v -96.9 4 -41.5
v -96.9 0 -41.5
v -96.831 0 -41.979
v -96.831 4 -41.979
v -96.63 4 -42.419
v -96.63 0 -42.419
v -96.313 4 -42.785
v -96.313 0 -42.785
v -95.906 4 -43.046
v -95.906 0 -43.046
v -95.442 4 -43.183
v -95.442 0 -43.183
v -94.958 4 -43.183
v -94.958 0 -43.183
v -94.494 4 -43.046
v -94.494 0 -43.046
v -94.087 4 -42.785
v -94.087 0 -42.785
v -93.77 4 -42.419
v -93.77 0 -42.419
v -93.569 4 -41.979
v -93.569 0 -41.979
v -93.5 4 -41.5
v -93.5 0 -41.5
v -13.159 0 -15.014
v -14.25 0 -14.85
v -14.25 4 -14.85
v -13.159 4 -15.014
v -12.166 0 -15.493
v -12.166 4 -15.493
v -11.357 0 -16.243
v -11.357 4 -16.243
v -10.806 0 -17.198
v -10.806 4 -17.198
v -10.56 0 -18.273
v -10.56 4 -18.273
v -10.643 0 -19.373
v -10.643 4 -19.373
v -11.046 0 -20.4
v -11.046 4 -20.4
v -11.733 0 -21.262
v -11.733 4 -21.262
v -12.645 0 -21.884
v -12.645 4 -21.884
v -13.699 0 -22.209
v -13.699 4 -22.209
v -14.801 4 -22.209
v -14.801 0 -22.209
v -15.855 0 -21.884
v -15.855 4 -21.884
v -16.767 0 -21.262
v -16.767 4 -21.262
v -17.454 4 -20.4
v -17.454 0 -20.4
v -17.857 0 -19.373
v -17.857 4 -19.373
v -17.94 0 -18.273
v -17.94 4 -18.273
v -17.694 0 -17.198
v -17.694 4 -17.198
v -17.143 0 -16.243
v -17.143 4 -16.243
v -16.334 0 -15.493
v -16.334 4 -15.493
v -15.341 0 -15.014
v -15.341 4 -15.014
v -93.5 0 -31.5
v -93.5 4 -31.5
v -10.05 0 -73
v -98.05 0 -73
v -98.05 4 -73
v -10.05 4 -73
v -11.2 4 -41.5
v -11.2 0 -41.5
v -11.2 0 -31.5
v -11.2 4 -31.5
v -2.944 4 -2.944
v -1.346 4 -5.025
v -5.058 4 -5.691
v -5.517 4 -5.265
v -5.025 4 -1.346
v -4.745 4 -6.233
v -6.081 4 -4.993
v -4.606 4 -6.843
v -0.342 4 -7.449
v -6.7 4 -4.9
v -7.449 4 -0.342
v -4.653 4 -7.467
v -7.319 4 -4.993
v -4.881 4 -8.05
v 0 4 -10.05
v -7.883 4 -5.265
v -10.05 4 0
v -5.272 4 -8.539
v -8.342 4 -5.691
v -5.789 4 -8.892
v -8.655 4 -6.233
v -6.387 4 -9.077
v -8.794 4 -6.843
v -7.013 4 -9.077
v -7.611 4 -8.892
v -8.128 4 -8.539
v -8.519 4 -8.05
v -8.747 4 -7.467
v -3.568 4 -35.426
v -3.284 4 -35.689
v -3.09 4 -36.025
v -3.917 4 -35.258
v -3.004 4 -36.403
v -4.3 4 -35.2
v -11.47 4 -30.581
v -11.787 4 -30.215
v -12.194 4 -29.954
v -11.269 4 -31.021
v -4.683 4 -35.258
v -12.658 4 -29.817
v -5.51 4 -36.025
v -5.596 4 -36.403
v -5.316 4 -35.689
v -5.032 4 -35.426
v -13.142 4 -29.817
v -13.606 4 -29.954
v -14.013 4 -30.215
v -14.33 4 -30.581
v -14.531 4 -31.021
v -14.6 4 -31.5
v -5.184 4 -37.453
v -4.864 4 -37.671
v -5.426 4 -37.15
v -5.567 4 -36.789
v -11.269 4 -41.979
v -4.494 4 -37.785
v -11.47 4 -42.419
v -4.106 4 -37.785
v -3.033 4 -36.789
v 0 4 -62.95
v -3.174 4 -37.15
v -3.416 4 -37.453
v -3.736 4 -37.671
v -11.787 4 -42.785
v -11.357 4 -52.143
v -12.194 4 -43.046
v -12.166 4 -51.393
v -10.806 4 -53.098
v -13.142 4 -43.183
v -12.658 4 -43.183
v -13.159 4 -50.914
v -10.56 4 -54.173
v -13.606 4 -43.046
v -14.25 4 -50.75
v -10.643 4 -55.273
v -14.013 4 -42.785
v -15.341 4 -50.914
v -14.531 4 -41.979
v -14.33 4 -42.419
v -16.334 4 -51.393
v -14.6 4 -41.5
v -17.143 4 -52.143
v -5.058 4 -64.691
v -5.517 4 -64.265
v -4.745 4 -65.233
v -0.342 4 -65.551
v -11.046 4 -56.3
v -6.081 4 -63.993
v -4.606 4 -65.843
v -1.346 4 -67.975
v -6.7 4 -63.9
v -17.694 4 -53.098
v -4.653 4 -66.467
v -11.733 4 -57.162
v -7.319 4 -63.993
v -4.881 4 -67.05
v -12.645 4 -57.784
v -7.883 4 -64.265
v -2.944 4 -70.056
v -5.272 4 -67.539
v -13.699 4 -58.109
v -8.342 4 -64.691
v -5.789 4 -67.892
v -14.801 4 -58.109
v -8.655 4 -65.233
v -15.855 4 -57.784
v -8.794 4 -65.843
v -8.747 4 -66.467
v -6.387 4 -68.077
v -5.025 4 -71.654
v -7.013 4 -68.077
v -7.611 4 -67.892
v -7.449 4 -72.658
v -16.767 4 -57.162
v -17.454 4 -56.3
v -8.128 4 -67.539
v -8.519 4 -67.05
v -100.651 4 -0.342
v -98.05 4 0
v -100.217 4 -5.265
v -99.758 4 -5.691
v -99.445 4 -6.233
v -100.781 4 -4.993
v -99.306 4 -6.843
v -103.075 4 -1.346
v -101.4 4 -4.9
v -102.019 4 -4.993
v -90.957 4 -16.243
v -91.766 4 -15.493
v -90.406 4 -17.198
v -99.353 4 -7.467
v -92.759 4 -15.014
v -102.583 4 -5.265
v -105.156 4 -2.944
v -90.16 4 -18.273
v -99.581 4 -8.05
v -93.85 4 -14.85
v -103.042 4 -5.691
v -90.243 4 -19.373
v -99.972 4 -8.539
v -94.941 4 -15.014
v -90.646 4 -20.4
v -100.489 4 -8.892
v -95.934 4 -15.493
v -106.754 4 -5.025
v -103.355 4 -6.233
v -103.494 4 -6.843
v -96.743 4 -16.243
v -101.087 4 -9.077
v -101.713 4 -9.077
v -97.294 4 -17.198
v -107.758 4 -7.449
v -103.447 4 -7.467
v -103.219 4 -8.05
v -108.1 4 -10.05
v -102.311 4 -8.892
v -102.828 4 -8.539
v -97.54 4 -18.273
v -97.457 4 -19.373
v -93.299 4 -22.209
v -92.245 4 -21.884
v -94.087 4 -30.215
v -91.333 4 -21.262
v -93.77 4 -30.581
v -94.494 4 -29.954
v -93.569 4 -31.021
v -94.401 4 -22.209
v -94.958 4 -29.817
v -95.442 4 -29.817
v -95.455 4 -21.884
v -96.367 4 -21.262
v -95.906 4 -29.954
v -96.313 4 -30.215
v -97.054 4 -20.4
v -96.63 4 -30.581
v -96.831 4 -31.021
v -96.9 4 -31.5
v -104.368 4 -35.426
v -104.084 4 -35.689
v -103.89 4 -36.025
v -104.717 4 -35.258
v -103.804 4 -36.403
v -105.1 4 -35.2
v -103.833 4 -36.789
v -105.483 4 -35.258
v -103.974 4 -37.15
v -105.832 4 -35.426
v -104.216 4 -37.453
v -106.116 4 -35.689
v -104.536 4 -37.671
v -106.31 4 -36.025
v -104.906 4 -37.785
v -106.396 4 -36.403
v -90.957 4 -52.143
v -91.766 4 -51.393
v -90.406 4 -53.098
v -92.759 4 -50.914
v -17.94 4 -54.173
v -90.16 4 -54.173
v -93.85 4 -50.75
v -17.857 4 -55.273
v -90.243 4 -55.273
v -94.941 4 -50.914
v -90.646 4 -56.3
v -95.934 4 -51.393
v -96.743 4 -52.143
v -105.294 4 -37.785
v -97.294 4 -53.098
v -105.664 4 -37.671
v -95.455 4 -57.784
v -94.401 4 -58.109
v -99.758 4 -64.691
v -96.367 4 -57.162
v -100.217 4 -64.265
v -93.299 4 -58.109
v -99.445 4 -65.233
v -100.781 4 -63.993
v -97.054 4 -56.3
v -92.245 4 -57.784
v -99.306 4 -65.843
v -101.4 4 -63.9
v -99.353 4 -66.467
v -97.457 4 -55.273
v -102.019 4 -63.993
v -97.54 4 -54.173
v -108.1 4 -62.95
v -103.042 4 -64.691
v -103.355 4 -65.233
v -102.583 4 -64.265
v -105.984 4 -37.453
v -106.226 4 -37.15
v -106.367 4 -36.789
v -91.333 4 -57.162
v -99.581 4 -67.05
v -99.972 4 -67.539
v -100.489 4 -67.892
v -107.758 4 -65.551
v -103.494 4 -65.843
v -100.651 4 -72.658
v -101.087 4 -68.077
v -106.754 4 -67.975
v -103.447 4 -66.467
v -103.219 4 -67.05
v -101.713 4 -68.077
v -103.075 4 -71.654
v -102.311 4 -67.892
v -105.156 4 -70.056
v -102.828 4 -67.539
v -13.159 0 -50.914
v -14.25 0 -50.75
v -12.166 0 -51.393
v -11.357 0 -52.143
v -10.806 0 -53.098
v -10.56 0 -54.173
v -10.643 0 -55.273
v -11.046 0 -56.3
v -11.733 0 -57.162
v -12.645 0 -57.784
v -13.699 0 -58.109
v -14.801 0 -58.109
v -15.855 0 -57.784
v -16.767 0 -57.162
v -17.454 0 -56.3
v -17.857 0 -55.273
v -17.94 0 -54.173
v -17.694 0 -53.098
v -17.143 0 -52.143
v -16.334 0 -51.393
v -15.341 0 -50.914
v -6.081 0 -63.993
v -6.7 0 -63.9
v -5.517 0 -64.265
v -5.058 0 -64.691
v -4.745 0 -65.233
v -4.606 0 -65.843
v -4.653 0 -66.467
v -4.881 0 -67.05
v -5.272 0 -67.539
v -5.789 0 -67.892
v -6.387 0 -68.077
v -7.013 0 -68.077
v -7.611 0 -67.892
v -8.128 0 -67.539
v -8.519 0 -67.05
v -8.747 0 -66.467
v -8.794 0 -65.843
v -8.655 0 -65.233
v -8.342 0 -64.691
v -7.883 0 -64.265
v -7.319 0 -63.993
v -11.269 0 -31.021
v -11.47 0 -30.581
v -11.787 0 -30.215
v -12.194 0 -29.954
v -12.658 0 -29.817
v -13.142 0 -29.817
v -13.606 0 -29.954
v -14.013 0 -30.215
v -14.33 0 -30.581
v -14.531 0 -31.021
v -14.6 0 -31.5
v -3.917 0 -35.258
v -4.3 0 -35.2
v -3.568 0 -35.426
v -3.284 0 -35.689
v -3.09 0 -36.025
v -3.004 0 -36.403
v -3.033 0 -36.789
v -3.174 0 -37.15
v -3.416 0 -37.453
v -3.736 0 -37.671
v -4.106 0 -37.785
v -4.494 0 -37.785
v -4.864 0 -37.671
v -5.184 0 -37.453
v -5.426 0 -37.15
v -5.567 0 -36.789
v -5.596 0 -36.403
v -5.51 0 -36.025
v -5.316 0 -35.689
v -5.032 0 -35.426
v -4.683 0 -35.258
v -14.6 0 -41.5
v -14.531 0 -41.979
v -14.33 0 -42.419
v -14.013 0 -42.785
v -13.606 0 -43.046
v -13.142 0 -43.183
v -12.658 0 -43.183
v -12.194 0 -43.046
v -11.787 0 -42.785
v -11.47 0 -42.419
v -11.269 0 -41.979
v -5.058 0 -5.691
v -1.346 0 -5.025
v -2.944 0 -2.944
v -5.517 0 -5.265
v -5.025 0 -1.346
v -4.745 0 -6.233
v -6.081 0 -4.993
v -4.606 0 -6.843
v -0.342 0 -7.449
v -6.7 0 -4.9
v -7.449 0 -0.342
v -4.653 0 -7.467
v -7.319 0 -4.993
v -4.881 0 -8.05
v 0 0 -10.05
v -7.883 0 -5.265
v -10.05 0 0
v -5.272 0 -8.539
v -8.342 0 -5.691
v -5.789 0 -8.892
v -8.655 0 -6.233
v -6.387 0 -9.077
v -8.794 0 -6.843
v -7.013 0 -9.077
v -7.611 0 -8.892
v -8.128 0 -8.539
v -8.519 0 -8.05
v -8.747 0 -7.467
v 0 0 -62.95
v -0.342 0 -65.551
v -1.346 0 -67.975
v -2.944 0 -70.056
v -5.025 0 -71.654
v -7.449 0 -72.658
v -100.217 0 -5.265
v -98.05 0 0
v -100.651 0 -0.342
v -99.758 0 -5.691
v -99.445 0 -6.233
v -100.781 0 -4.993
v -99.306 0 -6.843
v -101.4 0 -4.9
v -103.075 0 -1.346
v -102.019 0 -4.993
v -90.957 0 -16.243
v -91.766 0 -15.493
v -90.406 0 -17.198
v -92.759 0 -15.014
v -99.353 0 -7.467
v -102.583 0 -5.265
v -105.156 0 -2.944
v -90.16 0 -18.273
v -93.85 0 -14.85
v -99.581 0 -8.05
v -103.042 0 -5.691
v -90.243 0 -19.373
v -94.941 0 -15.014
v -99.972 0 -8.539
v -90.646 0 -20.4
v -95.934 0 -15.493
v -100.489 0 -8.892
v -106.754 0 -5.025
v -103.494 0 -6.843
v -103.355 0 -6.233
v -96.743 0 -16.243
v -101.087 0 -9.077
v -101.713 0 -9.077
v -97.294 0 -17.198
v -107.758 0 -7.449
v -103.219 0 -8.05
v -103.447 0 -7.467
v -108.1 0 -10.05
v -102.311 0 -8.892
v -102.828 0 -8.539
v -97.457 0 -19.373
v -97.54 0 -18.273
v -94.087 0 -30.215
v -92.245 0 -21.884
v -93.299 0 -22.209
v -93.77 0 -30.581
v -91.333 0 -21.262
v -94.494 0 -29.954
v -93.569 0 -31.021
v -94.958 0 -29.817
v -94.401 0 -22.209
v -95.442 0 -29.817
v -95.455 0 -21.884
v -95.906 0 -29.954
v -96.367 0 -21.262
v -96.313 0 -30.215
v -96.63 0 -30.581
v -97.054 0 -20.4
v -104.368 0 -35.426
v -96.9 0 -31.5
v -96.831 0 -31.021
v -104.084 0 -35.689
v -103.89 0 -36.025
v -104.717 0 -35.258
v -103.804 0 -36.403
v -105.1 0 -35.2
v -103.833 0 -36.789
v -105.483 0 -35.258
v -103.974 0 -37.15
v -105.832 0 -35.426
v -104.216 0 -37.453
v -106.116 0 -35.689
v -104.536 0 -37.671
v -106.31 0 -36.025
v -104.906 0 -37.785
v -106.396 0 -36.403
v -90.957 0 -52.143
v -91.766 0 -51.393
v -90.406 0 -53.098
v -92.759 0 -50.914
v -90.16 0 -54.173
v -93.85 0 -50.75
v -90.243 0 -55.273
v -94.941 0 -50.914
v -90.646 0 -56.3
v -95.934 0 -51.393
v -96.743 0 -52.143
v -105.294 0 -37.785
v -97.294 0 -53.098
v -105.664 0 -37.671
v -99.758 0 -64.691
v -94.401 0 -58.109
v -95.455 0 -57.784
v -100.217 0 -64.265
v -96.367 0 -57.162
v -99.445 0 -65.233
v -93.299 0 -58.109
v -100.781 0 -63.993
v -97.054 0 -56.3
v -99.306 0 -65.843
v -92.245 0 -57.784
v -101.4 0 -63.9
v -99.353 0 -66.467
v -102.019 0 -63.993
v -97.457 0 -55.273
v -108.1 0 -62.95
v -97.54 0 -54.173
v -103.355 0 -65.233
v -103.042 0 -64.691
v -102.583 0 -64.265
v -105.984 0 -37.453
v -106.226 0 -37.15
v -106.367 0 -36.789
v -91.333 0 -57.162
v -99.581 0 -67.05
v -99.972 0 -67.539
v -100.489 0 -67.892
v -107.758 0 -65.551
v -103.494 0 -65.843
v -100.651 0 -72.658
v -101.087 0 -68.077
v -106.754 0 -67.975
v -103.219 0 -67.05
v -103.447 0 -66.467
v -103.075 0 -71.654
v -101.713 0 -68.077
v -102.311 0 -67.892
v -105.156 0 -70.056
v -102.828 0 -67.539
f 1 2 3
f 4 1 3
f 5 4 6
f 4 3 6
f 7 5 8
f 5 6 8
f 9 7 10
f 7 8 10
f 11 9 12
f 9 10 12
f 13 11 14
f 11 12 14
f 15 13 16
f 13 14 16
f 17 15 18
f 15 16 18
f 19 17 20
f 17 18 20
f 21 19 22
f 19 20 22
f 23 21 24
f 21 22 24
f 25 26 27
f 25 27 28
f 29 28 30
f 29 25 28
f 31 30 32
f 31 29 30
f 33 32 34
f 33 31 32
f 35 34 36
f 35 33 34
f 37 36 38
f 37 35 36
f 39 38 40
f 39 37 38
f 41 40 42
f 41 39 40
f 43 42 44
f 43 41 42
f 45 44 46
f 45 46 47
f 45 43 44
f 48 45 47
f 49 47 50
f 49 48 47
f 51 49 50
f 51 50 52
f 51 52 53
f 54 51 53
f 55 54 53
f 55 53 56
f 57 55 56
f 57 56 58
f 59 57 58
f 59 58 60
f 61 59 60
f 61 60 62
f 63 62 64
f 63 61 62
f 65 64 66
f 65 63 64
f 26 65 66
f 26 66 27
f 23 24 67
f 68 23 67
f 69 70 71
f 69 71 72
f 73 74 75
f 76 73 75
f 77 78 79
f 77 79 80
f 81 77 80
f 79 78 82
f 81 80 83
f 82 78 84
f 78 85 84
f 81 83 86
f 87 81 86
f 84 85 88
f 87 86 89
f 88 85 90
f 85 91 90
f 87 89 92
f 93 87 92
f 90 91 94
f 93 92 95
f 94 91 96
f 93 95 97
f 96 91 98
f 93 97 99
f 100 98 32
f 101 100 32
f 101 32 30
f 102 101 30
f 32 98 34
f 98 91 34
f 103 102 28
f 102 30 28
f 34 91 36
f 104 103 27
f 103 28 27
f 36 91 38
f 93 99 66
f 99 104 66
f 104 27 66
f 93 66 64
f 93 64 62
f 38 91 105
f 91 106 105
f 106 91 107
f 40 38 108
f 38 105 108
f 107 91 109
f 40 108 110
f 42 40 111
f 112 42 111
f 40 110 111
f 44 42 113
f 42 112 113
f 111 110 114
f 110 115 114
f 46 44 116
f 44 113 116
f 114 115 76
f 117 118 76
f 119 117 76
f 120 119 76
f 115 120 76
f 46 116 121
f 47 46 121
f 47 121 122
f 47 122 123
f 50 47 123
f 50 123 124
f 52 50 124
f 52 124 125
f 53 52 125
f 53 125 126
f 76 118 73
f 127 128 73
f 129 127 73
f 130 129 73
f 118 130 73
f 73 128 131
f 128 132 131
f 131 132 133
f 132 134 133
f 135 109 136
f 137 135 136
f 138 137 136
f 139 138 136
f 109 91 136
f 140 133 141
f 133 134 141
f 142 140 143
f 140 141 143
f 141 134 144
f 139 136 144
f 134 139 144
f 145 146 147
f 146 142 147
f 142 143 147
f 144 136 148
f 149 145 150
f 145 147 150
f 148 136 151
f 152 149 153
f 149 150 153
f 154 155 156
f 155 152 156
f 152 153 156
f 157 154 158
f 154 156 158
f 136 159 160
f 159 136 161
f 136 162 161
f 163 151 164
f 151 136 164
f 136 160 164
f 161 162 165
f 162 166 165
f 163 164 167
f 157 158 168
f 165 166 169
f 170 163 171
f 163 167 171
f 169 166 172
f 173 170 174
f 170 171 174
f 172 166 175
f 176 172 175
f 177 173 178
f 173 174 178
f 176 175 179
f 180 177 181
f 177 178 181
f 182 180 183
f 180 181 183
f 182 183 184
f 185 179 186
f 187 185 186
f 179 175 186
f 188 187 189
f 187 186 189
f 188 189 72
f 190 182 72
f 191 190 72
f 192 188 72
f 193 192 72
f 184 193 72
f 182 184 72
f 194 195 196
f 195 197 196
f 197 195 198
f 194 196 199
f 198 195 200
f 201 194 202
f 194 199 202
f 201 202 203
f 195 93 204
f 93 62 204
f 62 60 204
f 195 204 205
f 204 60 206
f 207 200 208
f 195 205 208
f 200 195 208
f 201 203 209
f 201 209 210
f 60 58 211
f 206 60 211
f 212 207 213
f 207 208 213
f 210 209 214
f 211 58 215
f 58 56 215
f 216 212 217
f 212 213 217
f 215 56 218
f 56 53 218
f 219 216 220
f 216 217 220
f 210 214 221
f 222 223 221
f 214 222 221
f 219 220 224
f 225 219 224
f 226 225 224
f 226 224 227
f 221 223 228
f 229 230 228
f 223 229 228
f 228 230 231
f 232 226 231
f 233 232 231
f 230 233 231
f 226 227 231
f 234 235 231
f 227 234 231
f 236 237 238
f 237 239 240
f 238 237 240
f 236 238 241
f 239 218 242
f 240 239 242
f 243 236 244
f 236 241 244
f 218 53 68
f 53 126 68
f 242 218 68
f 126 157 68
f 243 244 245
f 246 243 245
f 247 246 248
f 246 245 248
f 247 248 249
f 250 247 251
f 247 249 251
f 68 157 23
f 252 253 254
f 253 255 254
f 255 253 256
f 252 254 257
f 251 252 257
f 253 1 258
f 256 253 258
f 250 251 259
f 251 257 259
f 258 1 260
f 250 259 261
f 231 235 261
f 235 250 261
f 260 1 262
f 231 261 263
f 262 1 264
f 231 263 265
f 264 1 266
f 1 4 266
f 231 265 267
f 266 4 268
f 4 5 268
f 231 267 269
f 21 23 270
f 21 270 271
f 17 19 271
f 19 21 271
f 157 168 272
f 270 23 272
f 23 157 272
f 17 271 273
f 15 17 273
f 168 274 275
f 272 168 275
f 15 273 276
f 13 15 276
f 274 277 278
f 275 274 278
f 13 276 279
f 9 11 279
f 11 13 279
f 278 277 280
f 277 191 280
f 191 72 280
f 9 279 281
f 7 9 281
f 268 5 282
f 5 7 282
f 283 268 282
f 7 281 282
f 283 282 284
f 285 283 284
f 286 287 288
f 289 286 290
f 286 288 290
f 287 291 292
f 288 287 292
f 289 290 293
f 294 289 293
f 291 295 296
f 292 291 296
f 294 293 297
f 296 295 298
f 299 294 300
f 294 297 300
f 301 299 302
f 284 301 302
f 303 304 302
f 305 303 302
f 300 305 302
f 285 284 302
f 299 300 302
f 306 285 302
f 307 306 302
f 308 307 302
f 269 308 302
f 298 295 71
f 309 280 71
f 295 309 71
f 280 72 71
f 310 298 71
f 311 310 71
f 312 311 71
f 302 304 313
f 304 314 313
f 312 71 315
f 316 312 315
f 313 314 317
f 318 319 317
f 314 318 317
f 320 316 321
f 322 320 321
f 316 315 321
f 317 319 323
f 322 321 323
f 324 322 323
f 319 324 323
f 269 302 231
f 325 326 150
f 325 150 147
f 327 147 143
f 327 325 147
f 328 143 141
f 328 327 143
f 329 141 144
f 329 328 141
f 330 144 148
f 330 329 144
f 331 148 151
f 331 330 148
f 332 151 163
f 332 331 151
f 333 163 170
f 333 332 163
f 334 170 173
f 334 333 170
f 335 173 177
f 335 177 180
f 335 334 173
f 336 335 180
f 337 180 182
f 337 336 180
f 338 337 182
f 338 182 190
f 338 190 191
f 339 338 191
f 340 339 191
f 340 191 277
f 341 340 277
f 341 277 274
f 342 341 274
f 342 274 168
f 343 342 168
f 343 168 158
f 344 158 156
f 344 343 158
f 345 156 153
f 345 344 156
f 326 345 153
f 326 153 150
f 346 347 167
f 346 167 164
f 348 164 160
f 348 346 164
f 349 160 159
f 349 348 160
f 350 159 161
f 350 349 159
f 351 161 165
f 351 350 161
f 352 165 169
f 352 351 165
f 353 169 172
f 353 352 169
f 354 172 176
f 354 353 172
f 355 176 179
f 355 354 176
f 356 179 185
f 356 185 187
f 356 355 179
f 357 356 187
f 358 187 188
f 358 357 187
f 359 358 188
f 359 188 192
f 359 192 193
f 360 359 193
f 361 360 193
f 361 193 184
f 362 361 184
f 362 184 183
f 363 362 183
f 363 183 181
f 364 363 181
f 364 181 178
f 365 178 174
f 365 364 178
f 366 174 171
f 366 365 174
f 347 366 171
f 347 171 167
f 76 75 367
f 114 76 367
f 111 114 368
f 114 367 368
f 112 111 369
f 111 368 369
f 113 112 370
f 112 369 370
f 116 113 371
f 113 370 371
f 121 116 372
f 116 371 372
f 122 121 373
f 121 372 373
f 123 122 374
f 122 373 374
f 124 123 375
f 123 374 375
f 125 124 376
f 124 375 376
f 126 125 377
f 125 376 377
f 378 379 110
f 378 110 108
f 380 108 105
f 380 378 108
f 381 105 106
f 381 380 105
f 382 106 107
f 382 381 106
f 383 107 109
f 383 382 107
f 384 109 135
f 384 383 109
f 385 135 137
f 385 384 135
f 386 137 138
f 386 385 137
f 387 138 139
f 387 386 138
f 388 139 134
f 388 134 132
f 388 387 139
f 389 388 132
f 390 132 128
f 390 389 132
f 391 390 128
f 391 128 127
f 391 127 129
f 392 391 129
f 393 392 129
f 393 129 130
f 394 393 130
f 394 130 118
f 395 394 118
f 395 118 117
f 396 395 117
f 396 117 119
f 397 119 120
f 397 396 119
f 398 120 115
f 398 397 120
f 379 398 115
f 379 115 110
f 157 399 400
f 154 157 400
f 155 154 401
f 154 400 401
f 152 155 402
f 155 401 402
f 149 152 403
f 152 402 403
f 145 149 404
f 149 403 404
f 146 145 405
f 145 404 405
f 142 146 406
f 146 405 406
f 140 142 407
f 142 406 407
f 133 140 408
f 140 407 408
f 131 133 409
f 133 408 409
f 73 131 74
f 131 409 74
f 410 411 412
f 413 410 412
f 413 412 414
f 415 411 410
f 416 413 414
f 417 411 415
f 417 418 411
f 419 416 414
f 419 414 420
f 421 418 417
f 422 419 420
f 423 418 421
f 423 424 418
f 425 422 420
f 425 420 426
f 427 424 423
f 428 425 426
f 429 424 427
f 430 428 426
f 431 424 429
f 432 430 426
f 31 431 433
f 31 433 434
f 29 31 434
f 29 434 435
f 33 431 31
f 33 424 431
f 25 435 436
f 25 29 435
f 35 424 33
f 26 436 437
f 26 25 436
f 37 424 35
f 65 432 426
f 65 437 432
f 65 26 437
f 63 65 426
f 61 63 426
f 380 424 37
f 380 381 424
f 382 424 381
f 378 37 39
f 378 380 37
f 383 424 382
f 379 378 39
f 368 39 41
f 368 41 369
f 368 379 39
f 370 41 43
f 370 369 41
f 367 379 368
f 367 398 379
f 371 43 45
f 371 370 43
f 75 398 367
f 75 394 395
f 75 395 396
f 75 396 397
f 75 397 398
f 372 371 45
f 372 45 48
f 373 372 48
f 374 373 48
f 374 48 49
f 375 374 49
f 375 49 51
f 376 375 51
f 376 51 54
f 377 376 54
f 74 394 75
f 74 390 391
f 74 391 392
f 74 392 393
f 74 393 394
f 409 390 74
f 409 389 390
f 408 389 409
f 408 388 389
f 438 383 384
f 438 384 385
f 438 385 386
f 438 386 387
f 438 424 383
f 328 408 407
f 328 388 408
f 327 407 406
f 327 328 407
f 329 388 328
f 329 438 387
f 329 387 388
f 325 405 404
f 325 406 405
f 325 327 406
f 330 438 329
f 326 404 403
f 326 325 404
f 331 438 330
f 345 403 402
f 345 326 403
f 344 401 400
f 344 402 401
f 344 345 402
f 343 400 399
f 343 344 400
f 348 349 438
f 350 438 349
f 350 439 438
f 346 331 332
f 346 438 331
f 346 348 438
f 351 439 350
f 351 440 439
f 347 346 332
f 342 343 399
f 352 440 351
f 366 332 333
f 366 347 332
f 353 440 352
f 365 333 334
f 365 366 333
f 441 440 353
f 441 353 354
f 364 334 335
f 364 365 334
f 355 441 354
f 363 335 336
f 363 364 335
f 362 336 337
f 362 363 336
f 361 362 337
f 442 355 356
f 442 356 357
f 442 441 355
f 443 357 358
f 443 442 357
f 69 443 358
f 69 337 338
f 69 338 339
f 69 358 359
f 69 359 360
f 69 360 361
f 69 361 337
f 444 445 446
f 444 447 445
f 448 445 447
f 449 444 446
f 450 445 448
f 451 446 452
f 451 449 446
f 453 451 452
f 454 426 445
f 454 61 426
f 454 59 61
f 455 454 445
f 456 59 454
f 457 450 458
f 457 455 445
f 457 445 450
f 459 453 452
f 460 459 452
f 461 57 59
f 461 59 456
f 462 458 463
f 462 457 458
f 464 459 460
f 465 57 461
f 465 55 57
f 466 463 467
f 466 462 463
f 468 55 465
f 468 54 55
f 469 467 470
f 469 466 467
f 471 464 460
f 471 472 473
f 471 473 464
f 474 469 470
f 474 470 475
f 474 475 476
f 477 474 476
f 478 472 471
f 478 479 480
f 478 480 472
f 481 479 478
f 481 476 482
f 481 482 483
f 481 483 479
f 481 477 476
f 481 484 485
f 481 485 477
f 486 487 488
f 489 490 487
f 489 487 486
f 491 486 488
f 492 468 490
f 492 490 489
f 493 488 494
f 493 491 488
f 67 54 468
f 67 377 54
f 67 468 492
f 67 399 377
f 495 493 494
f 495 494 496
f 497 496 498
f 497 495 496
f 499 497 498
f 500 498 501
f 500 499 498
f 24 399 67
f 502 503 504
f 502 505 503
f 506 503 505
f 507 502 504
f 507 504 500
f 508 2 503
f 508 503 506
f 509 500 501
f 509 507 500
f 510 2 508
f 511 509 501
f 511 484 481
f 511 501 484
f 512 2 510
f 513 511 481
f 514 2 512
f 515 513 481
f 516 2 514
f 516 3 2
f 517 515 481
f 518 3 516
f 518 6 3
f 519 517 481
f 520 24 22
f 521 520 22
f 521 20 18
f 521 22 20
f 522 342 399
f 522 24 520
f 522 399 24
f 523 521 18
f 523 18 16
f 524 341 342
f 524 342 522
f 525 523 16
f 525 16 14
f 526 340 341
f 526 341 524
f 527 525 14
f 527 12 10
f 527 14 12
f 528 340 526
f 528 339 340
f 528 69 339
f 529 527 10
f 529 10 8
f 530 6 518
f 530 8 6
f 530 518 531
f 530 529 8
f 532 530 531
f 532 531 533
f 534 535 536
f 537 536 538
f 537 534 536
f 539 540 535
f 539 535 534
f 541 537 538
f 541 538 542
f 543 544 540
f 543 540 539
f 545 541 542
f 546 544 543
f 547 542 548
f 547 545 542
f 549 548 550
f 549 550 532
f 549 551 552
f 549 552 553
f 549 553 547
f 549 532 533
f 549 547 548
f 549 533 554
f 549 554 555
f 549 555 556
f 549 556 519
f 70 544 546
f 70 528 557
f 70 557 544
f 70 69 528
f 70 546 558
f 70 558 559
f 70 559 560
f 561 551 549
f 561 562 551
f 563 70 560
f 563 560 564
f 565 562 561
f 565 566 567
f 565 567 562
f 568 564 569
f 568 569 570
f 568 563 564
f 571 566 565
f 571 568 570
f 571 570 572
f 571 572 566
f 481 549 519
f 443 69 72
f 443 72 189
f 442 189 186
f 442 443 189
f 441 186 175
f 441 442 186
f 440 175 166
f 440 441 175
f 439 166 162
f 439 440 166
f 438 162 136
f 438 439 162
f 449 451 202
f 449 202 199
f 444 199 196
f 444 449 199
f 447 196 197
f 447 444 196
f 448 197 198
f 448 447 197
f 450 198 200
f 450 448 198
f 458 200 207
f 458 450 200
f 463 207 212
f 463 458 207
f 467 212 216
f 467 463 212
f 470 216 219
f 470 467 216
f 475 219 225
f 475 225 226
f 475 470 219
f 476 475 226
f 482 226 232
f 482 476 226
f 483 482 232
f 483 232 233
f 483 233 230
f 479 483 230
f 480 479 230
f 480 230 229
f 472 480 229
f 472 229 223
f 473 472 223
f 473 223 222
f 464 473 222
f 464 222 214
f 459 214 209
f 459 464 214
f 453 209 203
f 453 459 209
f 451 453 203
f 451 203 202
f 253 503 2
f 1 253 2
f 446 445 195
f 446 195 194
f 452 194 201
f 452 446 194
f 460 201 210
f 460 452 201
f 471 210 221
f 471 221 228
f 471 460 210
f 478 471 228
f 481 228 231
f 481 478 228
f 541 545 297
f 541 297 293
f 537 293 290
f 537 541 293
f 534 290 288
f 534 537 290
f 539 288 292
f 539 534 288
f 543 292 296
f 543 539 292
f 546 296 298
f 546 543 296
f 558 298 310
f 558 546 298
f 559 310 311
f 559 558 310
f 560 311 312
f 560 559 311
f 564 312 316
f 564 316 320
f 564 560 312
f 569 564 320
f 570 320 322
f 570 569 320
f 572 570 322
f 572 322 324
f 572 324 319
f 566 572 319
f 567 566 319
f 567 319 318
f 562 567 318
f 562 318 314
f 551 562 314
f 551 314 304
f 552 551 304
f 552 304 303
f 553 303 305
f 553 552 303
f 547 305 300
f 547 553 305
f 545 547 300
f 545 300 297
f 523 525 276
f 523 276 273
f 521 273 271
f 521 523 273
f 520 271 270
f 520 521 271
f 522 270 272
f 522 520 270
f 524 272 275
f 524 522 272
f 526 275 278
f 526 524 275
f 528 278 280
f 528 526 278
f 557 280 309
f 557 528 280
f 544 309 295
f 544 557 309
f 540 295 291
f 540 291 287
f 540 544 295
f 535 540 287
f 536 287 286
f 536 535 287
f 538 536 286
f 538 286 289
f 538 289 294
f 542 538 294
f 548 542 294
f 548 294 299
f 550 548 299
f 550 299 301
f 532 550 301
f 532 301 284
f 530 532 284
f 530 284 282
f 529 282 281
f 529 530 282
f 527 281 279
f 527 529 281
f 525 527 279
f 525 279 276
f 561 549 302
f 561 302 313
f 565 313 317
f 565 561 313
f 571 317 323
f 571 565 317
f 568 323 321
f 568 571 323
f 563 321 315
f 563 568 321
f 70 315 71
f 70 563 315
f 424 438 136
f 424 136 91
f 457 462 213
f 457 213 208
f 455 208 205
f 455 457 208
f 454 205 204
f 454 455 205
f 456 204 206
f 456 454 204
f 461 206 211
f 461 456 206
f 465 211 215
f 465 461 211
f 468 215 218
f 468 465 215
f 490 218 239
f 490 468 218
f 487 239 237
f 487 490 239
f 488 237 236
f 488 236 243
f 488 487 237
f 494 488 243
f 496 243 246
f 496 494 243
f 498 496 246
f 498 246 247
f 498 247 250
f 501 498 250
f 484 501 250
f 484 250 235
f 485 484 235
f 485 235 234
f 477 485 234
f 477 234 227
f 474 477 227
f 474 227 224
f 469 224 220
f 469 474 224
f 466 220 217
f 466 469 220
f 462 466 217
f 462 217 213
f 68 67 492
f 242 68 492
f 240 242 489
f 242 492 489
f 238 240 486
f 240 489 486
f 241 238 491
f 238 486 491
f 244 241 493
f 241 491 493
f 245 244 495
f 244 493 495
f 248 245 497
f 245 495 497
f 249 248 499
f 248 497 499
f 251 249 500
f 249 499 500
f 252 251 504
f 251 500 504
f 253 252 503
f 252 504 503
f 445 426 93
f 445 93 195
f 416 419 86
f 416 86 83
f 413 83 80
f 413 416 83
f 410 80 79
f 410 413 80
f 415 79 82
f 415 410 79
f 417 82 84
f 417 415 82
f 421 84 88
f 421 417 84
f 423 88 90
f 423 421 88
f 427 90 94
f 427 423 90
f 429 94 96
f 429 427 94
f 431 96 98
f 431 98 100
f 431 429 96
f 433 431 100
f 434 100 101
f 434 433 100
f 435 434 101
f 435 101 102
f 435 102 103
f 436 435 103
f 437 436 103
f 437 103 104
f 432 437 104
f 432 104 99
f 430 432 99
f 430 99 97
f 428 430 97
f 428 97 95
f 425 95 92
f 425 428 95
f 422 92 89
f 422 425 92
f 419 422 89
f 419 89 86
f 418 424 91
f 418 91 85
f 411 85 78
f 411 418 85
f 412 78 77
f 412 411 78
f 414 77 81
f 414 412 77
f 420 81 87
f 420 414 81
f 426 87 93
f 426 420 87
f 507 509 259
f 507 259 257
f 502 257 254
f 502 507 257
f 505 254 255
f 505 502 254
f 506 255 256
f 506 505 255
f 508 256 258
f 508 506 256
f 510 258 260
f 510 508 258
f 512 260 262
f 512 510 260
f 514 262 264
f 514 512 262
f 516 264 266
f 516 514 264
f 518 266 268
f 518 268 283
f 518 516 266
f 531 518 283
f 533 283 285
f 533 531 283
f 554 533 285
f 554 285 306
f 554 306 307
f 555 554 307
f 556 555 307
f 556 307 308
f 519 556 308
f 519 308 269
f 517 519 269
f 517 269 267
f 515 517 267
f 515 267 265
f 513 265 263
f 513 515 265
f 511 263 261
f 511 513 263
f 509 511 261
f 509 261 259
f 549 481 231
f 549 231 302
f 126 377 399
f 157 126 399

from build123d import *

# Parameters (mm, degrees)
SCHIZZO1_R                   = 2.1
SCHIZZO1_R_2                 = 3.7
SCHIZZO1_R_3                 = 1.3
ESTRUSIONE_ESTRUSIONE1_DEPTH = 4


with BuildPart() as part:
    # Schizzo1 → Estrusione-Estrusione1 (new body)
    with BuildSketch(Plane(origin=(0, 0, 0), x_dir=(1, 0, 0), z_dir=(0, 1, 0))):
        with BuildLine():
            Line((-10.05, 0), (-98.05, 0))
            ThreePointArc((-98.05, 0), (-105.156423151, 2.943576849), (-108.1, 10.05))
            Line((-108.1, 10.05), (-108.1, 62.95))
            ThreePointArc((-108.1, 62.95), (-105.156423151, 70.056423151), (-98.05, 73))
            Line((-98.05, 73), (-10.05, 73))
            ThreePointArc((-10.05, 73), (-2.943576849, 70.056423151), (0, 62.95))
            Line((0, 62.95), (0, 10.05))
            ThreePointArc((0, 10.05), (-2.943576849, 2.943576849), (-10.05, 0))
        make_face()
        with Locations(Location((-6.7, 66, 0), (0, 0, 270))):
            Circle(SCHIZZO1_R, mode=Mode.SUBTRACT)
        with Locations(Location((-6.7, 7, 0), (0, 0, 270))):
            Circle(SCHIZZO1_R, mode=Mode.SUBTRACT)
        with Locations(Location((-101.4, 66, 0), (0, 0, 270))):
            Circle(SCHIZZO1_R, mode=Mode.SUBTRACT)
        with Locations(Location((-101.4, 7, 0), (0, 0, 270))):
            Circle(SCHIZZO1_R, mode=Mode.SUBTRACT)
        with Locations(Location((-93.85, 54.45, 0), (0, 0, 270))):
            Circle(SCHIZZO1_R_2, mode=Mode.SUBTRACT)
        with Locations(Location((-93.85, 18.55, 0), (0, 0, 270))):
            Circle(SCHIZZO1_R_2, mode=Mode.SUBTRACT)
        with Locations(Location((-14.25, 18.55, 0), (0, 0, 270))):
            Circle(SCHIZZO1_R_2, mode=Mode.SUBTRACT)
        with Locations(Location((-14.25, 54.45, 0), (0, 0, 270))):
            Circle(SCHIZZO1_R_2, mode=Mode.SUBTRACT)
        with Locations(Location((-4.3, 36.5, 0), (0, 0, 270))):
            Circle(SCHIZZO1_R_3, mode=Mode.SUBTRACT)
        with Locations(Location((-105.1, 36.5, 0), (0, 0, 270))):
            Circle(SCHIZZO1_R_3, mode=Mode.SUBTRACT)
        with BuildLine():
            Line((-96.9, 31.5), (-96.9, 41.5))
            ThreePointArc((-96.9, 41.5), (-95.2, 43.2), (-93.5, 41.5))
            Line((-93.5, 41.5), (-93.5, 31.5))
            ThreePointArc((-93.5, 31.5), (-95.2, 29.8), (-96.9, 31.5))
        make_face(mode=Mode.SUBTRACT)
        with BuildLine():
            Line((-14.6, 31.5), (-14.6, 41.5))
            ThreePointArc((-14.6, 41.5), (-12.9, 43.2), (-11.2, 41.5))
            Line((-11.2, 41.5), (-11.2, 31.5))
            ThreePointArc((-11.2, 31.5), (-12.9, 29.8), (-14.6, 31.5))
        make_face(mode=Mode.SUBTRACT)
    extrude(amount=ESTRUSIONE_ESTRUSIONE1_DEPTH)


solid = part.part
